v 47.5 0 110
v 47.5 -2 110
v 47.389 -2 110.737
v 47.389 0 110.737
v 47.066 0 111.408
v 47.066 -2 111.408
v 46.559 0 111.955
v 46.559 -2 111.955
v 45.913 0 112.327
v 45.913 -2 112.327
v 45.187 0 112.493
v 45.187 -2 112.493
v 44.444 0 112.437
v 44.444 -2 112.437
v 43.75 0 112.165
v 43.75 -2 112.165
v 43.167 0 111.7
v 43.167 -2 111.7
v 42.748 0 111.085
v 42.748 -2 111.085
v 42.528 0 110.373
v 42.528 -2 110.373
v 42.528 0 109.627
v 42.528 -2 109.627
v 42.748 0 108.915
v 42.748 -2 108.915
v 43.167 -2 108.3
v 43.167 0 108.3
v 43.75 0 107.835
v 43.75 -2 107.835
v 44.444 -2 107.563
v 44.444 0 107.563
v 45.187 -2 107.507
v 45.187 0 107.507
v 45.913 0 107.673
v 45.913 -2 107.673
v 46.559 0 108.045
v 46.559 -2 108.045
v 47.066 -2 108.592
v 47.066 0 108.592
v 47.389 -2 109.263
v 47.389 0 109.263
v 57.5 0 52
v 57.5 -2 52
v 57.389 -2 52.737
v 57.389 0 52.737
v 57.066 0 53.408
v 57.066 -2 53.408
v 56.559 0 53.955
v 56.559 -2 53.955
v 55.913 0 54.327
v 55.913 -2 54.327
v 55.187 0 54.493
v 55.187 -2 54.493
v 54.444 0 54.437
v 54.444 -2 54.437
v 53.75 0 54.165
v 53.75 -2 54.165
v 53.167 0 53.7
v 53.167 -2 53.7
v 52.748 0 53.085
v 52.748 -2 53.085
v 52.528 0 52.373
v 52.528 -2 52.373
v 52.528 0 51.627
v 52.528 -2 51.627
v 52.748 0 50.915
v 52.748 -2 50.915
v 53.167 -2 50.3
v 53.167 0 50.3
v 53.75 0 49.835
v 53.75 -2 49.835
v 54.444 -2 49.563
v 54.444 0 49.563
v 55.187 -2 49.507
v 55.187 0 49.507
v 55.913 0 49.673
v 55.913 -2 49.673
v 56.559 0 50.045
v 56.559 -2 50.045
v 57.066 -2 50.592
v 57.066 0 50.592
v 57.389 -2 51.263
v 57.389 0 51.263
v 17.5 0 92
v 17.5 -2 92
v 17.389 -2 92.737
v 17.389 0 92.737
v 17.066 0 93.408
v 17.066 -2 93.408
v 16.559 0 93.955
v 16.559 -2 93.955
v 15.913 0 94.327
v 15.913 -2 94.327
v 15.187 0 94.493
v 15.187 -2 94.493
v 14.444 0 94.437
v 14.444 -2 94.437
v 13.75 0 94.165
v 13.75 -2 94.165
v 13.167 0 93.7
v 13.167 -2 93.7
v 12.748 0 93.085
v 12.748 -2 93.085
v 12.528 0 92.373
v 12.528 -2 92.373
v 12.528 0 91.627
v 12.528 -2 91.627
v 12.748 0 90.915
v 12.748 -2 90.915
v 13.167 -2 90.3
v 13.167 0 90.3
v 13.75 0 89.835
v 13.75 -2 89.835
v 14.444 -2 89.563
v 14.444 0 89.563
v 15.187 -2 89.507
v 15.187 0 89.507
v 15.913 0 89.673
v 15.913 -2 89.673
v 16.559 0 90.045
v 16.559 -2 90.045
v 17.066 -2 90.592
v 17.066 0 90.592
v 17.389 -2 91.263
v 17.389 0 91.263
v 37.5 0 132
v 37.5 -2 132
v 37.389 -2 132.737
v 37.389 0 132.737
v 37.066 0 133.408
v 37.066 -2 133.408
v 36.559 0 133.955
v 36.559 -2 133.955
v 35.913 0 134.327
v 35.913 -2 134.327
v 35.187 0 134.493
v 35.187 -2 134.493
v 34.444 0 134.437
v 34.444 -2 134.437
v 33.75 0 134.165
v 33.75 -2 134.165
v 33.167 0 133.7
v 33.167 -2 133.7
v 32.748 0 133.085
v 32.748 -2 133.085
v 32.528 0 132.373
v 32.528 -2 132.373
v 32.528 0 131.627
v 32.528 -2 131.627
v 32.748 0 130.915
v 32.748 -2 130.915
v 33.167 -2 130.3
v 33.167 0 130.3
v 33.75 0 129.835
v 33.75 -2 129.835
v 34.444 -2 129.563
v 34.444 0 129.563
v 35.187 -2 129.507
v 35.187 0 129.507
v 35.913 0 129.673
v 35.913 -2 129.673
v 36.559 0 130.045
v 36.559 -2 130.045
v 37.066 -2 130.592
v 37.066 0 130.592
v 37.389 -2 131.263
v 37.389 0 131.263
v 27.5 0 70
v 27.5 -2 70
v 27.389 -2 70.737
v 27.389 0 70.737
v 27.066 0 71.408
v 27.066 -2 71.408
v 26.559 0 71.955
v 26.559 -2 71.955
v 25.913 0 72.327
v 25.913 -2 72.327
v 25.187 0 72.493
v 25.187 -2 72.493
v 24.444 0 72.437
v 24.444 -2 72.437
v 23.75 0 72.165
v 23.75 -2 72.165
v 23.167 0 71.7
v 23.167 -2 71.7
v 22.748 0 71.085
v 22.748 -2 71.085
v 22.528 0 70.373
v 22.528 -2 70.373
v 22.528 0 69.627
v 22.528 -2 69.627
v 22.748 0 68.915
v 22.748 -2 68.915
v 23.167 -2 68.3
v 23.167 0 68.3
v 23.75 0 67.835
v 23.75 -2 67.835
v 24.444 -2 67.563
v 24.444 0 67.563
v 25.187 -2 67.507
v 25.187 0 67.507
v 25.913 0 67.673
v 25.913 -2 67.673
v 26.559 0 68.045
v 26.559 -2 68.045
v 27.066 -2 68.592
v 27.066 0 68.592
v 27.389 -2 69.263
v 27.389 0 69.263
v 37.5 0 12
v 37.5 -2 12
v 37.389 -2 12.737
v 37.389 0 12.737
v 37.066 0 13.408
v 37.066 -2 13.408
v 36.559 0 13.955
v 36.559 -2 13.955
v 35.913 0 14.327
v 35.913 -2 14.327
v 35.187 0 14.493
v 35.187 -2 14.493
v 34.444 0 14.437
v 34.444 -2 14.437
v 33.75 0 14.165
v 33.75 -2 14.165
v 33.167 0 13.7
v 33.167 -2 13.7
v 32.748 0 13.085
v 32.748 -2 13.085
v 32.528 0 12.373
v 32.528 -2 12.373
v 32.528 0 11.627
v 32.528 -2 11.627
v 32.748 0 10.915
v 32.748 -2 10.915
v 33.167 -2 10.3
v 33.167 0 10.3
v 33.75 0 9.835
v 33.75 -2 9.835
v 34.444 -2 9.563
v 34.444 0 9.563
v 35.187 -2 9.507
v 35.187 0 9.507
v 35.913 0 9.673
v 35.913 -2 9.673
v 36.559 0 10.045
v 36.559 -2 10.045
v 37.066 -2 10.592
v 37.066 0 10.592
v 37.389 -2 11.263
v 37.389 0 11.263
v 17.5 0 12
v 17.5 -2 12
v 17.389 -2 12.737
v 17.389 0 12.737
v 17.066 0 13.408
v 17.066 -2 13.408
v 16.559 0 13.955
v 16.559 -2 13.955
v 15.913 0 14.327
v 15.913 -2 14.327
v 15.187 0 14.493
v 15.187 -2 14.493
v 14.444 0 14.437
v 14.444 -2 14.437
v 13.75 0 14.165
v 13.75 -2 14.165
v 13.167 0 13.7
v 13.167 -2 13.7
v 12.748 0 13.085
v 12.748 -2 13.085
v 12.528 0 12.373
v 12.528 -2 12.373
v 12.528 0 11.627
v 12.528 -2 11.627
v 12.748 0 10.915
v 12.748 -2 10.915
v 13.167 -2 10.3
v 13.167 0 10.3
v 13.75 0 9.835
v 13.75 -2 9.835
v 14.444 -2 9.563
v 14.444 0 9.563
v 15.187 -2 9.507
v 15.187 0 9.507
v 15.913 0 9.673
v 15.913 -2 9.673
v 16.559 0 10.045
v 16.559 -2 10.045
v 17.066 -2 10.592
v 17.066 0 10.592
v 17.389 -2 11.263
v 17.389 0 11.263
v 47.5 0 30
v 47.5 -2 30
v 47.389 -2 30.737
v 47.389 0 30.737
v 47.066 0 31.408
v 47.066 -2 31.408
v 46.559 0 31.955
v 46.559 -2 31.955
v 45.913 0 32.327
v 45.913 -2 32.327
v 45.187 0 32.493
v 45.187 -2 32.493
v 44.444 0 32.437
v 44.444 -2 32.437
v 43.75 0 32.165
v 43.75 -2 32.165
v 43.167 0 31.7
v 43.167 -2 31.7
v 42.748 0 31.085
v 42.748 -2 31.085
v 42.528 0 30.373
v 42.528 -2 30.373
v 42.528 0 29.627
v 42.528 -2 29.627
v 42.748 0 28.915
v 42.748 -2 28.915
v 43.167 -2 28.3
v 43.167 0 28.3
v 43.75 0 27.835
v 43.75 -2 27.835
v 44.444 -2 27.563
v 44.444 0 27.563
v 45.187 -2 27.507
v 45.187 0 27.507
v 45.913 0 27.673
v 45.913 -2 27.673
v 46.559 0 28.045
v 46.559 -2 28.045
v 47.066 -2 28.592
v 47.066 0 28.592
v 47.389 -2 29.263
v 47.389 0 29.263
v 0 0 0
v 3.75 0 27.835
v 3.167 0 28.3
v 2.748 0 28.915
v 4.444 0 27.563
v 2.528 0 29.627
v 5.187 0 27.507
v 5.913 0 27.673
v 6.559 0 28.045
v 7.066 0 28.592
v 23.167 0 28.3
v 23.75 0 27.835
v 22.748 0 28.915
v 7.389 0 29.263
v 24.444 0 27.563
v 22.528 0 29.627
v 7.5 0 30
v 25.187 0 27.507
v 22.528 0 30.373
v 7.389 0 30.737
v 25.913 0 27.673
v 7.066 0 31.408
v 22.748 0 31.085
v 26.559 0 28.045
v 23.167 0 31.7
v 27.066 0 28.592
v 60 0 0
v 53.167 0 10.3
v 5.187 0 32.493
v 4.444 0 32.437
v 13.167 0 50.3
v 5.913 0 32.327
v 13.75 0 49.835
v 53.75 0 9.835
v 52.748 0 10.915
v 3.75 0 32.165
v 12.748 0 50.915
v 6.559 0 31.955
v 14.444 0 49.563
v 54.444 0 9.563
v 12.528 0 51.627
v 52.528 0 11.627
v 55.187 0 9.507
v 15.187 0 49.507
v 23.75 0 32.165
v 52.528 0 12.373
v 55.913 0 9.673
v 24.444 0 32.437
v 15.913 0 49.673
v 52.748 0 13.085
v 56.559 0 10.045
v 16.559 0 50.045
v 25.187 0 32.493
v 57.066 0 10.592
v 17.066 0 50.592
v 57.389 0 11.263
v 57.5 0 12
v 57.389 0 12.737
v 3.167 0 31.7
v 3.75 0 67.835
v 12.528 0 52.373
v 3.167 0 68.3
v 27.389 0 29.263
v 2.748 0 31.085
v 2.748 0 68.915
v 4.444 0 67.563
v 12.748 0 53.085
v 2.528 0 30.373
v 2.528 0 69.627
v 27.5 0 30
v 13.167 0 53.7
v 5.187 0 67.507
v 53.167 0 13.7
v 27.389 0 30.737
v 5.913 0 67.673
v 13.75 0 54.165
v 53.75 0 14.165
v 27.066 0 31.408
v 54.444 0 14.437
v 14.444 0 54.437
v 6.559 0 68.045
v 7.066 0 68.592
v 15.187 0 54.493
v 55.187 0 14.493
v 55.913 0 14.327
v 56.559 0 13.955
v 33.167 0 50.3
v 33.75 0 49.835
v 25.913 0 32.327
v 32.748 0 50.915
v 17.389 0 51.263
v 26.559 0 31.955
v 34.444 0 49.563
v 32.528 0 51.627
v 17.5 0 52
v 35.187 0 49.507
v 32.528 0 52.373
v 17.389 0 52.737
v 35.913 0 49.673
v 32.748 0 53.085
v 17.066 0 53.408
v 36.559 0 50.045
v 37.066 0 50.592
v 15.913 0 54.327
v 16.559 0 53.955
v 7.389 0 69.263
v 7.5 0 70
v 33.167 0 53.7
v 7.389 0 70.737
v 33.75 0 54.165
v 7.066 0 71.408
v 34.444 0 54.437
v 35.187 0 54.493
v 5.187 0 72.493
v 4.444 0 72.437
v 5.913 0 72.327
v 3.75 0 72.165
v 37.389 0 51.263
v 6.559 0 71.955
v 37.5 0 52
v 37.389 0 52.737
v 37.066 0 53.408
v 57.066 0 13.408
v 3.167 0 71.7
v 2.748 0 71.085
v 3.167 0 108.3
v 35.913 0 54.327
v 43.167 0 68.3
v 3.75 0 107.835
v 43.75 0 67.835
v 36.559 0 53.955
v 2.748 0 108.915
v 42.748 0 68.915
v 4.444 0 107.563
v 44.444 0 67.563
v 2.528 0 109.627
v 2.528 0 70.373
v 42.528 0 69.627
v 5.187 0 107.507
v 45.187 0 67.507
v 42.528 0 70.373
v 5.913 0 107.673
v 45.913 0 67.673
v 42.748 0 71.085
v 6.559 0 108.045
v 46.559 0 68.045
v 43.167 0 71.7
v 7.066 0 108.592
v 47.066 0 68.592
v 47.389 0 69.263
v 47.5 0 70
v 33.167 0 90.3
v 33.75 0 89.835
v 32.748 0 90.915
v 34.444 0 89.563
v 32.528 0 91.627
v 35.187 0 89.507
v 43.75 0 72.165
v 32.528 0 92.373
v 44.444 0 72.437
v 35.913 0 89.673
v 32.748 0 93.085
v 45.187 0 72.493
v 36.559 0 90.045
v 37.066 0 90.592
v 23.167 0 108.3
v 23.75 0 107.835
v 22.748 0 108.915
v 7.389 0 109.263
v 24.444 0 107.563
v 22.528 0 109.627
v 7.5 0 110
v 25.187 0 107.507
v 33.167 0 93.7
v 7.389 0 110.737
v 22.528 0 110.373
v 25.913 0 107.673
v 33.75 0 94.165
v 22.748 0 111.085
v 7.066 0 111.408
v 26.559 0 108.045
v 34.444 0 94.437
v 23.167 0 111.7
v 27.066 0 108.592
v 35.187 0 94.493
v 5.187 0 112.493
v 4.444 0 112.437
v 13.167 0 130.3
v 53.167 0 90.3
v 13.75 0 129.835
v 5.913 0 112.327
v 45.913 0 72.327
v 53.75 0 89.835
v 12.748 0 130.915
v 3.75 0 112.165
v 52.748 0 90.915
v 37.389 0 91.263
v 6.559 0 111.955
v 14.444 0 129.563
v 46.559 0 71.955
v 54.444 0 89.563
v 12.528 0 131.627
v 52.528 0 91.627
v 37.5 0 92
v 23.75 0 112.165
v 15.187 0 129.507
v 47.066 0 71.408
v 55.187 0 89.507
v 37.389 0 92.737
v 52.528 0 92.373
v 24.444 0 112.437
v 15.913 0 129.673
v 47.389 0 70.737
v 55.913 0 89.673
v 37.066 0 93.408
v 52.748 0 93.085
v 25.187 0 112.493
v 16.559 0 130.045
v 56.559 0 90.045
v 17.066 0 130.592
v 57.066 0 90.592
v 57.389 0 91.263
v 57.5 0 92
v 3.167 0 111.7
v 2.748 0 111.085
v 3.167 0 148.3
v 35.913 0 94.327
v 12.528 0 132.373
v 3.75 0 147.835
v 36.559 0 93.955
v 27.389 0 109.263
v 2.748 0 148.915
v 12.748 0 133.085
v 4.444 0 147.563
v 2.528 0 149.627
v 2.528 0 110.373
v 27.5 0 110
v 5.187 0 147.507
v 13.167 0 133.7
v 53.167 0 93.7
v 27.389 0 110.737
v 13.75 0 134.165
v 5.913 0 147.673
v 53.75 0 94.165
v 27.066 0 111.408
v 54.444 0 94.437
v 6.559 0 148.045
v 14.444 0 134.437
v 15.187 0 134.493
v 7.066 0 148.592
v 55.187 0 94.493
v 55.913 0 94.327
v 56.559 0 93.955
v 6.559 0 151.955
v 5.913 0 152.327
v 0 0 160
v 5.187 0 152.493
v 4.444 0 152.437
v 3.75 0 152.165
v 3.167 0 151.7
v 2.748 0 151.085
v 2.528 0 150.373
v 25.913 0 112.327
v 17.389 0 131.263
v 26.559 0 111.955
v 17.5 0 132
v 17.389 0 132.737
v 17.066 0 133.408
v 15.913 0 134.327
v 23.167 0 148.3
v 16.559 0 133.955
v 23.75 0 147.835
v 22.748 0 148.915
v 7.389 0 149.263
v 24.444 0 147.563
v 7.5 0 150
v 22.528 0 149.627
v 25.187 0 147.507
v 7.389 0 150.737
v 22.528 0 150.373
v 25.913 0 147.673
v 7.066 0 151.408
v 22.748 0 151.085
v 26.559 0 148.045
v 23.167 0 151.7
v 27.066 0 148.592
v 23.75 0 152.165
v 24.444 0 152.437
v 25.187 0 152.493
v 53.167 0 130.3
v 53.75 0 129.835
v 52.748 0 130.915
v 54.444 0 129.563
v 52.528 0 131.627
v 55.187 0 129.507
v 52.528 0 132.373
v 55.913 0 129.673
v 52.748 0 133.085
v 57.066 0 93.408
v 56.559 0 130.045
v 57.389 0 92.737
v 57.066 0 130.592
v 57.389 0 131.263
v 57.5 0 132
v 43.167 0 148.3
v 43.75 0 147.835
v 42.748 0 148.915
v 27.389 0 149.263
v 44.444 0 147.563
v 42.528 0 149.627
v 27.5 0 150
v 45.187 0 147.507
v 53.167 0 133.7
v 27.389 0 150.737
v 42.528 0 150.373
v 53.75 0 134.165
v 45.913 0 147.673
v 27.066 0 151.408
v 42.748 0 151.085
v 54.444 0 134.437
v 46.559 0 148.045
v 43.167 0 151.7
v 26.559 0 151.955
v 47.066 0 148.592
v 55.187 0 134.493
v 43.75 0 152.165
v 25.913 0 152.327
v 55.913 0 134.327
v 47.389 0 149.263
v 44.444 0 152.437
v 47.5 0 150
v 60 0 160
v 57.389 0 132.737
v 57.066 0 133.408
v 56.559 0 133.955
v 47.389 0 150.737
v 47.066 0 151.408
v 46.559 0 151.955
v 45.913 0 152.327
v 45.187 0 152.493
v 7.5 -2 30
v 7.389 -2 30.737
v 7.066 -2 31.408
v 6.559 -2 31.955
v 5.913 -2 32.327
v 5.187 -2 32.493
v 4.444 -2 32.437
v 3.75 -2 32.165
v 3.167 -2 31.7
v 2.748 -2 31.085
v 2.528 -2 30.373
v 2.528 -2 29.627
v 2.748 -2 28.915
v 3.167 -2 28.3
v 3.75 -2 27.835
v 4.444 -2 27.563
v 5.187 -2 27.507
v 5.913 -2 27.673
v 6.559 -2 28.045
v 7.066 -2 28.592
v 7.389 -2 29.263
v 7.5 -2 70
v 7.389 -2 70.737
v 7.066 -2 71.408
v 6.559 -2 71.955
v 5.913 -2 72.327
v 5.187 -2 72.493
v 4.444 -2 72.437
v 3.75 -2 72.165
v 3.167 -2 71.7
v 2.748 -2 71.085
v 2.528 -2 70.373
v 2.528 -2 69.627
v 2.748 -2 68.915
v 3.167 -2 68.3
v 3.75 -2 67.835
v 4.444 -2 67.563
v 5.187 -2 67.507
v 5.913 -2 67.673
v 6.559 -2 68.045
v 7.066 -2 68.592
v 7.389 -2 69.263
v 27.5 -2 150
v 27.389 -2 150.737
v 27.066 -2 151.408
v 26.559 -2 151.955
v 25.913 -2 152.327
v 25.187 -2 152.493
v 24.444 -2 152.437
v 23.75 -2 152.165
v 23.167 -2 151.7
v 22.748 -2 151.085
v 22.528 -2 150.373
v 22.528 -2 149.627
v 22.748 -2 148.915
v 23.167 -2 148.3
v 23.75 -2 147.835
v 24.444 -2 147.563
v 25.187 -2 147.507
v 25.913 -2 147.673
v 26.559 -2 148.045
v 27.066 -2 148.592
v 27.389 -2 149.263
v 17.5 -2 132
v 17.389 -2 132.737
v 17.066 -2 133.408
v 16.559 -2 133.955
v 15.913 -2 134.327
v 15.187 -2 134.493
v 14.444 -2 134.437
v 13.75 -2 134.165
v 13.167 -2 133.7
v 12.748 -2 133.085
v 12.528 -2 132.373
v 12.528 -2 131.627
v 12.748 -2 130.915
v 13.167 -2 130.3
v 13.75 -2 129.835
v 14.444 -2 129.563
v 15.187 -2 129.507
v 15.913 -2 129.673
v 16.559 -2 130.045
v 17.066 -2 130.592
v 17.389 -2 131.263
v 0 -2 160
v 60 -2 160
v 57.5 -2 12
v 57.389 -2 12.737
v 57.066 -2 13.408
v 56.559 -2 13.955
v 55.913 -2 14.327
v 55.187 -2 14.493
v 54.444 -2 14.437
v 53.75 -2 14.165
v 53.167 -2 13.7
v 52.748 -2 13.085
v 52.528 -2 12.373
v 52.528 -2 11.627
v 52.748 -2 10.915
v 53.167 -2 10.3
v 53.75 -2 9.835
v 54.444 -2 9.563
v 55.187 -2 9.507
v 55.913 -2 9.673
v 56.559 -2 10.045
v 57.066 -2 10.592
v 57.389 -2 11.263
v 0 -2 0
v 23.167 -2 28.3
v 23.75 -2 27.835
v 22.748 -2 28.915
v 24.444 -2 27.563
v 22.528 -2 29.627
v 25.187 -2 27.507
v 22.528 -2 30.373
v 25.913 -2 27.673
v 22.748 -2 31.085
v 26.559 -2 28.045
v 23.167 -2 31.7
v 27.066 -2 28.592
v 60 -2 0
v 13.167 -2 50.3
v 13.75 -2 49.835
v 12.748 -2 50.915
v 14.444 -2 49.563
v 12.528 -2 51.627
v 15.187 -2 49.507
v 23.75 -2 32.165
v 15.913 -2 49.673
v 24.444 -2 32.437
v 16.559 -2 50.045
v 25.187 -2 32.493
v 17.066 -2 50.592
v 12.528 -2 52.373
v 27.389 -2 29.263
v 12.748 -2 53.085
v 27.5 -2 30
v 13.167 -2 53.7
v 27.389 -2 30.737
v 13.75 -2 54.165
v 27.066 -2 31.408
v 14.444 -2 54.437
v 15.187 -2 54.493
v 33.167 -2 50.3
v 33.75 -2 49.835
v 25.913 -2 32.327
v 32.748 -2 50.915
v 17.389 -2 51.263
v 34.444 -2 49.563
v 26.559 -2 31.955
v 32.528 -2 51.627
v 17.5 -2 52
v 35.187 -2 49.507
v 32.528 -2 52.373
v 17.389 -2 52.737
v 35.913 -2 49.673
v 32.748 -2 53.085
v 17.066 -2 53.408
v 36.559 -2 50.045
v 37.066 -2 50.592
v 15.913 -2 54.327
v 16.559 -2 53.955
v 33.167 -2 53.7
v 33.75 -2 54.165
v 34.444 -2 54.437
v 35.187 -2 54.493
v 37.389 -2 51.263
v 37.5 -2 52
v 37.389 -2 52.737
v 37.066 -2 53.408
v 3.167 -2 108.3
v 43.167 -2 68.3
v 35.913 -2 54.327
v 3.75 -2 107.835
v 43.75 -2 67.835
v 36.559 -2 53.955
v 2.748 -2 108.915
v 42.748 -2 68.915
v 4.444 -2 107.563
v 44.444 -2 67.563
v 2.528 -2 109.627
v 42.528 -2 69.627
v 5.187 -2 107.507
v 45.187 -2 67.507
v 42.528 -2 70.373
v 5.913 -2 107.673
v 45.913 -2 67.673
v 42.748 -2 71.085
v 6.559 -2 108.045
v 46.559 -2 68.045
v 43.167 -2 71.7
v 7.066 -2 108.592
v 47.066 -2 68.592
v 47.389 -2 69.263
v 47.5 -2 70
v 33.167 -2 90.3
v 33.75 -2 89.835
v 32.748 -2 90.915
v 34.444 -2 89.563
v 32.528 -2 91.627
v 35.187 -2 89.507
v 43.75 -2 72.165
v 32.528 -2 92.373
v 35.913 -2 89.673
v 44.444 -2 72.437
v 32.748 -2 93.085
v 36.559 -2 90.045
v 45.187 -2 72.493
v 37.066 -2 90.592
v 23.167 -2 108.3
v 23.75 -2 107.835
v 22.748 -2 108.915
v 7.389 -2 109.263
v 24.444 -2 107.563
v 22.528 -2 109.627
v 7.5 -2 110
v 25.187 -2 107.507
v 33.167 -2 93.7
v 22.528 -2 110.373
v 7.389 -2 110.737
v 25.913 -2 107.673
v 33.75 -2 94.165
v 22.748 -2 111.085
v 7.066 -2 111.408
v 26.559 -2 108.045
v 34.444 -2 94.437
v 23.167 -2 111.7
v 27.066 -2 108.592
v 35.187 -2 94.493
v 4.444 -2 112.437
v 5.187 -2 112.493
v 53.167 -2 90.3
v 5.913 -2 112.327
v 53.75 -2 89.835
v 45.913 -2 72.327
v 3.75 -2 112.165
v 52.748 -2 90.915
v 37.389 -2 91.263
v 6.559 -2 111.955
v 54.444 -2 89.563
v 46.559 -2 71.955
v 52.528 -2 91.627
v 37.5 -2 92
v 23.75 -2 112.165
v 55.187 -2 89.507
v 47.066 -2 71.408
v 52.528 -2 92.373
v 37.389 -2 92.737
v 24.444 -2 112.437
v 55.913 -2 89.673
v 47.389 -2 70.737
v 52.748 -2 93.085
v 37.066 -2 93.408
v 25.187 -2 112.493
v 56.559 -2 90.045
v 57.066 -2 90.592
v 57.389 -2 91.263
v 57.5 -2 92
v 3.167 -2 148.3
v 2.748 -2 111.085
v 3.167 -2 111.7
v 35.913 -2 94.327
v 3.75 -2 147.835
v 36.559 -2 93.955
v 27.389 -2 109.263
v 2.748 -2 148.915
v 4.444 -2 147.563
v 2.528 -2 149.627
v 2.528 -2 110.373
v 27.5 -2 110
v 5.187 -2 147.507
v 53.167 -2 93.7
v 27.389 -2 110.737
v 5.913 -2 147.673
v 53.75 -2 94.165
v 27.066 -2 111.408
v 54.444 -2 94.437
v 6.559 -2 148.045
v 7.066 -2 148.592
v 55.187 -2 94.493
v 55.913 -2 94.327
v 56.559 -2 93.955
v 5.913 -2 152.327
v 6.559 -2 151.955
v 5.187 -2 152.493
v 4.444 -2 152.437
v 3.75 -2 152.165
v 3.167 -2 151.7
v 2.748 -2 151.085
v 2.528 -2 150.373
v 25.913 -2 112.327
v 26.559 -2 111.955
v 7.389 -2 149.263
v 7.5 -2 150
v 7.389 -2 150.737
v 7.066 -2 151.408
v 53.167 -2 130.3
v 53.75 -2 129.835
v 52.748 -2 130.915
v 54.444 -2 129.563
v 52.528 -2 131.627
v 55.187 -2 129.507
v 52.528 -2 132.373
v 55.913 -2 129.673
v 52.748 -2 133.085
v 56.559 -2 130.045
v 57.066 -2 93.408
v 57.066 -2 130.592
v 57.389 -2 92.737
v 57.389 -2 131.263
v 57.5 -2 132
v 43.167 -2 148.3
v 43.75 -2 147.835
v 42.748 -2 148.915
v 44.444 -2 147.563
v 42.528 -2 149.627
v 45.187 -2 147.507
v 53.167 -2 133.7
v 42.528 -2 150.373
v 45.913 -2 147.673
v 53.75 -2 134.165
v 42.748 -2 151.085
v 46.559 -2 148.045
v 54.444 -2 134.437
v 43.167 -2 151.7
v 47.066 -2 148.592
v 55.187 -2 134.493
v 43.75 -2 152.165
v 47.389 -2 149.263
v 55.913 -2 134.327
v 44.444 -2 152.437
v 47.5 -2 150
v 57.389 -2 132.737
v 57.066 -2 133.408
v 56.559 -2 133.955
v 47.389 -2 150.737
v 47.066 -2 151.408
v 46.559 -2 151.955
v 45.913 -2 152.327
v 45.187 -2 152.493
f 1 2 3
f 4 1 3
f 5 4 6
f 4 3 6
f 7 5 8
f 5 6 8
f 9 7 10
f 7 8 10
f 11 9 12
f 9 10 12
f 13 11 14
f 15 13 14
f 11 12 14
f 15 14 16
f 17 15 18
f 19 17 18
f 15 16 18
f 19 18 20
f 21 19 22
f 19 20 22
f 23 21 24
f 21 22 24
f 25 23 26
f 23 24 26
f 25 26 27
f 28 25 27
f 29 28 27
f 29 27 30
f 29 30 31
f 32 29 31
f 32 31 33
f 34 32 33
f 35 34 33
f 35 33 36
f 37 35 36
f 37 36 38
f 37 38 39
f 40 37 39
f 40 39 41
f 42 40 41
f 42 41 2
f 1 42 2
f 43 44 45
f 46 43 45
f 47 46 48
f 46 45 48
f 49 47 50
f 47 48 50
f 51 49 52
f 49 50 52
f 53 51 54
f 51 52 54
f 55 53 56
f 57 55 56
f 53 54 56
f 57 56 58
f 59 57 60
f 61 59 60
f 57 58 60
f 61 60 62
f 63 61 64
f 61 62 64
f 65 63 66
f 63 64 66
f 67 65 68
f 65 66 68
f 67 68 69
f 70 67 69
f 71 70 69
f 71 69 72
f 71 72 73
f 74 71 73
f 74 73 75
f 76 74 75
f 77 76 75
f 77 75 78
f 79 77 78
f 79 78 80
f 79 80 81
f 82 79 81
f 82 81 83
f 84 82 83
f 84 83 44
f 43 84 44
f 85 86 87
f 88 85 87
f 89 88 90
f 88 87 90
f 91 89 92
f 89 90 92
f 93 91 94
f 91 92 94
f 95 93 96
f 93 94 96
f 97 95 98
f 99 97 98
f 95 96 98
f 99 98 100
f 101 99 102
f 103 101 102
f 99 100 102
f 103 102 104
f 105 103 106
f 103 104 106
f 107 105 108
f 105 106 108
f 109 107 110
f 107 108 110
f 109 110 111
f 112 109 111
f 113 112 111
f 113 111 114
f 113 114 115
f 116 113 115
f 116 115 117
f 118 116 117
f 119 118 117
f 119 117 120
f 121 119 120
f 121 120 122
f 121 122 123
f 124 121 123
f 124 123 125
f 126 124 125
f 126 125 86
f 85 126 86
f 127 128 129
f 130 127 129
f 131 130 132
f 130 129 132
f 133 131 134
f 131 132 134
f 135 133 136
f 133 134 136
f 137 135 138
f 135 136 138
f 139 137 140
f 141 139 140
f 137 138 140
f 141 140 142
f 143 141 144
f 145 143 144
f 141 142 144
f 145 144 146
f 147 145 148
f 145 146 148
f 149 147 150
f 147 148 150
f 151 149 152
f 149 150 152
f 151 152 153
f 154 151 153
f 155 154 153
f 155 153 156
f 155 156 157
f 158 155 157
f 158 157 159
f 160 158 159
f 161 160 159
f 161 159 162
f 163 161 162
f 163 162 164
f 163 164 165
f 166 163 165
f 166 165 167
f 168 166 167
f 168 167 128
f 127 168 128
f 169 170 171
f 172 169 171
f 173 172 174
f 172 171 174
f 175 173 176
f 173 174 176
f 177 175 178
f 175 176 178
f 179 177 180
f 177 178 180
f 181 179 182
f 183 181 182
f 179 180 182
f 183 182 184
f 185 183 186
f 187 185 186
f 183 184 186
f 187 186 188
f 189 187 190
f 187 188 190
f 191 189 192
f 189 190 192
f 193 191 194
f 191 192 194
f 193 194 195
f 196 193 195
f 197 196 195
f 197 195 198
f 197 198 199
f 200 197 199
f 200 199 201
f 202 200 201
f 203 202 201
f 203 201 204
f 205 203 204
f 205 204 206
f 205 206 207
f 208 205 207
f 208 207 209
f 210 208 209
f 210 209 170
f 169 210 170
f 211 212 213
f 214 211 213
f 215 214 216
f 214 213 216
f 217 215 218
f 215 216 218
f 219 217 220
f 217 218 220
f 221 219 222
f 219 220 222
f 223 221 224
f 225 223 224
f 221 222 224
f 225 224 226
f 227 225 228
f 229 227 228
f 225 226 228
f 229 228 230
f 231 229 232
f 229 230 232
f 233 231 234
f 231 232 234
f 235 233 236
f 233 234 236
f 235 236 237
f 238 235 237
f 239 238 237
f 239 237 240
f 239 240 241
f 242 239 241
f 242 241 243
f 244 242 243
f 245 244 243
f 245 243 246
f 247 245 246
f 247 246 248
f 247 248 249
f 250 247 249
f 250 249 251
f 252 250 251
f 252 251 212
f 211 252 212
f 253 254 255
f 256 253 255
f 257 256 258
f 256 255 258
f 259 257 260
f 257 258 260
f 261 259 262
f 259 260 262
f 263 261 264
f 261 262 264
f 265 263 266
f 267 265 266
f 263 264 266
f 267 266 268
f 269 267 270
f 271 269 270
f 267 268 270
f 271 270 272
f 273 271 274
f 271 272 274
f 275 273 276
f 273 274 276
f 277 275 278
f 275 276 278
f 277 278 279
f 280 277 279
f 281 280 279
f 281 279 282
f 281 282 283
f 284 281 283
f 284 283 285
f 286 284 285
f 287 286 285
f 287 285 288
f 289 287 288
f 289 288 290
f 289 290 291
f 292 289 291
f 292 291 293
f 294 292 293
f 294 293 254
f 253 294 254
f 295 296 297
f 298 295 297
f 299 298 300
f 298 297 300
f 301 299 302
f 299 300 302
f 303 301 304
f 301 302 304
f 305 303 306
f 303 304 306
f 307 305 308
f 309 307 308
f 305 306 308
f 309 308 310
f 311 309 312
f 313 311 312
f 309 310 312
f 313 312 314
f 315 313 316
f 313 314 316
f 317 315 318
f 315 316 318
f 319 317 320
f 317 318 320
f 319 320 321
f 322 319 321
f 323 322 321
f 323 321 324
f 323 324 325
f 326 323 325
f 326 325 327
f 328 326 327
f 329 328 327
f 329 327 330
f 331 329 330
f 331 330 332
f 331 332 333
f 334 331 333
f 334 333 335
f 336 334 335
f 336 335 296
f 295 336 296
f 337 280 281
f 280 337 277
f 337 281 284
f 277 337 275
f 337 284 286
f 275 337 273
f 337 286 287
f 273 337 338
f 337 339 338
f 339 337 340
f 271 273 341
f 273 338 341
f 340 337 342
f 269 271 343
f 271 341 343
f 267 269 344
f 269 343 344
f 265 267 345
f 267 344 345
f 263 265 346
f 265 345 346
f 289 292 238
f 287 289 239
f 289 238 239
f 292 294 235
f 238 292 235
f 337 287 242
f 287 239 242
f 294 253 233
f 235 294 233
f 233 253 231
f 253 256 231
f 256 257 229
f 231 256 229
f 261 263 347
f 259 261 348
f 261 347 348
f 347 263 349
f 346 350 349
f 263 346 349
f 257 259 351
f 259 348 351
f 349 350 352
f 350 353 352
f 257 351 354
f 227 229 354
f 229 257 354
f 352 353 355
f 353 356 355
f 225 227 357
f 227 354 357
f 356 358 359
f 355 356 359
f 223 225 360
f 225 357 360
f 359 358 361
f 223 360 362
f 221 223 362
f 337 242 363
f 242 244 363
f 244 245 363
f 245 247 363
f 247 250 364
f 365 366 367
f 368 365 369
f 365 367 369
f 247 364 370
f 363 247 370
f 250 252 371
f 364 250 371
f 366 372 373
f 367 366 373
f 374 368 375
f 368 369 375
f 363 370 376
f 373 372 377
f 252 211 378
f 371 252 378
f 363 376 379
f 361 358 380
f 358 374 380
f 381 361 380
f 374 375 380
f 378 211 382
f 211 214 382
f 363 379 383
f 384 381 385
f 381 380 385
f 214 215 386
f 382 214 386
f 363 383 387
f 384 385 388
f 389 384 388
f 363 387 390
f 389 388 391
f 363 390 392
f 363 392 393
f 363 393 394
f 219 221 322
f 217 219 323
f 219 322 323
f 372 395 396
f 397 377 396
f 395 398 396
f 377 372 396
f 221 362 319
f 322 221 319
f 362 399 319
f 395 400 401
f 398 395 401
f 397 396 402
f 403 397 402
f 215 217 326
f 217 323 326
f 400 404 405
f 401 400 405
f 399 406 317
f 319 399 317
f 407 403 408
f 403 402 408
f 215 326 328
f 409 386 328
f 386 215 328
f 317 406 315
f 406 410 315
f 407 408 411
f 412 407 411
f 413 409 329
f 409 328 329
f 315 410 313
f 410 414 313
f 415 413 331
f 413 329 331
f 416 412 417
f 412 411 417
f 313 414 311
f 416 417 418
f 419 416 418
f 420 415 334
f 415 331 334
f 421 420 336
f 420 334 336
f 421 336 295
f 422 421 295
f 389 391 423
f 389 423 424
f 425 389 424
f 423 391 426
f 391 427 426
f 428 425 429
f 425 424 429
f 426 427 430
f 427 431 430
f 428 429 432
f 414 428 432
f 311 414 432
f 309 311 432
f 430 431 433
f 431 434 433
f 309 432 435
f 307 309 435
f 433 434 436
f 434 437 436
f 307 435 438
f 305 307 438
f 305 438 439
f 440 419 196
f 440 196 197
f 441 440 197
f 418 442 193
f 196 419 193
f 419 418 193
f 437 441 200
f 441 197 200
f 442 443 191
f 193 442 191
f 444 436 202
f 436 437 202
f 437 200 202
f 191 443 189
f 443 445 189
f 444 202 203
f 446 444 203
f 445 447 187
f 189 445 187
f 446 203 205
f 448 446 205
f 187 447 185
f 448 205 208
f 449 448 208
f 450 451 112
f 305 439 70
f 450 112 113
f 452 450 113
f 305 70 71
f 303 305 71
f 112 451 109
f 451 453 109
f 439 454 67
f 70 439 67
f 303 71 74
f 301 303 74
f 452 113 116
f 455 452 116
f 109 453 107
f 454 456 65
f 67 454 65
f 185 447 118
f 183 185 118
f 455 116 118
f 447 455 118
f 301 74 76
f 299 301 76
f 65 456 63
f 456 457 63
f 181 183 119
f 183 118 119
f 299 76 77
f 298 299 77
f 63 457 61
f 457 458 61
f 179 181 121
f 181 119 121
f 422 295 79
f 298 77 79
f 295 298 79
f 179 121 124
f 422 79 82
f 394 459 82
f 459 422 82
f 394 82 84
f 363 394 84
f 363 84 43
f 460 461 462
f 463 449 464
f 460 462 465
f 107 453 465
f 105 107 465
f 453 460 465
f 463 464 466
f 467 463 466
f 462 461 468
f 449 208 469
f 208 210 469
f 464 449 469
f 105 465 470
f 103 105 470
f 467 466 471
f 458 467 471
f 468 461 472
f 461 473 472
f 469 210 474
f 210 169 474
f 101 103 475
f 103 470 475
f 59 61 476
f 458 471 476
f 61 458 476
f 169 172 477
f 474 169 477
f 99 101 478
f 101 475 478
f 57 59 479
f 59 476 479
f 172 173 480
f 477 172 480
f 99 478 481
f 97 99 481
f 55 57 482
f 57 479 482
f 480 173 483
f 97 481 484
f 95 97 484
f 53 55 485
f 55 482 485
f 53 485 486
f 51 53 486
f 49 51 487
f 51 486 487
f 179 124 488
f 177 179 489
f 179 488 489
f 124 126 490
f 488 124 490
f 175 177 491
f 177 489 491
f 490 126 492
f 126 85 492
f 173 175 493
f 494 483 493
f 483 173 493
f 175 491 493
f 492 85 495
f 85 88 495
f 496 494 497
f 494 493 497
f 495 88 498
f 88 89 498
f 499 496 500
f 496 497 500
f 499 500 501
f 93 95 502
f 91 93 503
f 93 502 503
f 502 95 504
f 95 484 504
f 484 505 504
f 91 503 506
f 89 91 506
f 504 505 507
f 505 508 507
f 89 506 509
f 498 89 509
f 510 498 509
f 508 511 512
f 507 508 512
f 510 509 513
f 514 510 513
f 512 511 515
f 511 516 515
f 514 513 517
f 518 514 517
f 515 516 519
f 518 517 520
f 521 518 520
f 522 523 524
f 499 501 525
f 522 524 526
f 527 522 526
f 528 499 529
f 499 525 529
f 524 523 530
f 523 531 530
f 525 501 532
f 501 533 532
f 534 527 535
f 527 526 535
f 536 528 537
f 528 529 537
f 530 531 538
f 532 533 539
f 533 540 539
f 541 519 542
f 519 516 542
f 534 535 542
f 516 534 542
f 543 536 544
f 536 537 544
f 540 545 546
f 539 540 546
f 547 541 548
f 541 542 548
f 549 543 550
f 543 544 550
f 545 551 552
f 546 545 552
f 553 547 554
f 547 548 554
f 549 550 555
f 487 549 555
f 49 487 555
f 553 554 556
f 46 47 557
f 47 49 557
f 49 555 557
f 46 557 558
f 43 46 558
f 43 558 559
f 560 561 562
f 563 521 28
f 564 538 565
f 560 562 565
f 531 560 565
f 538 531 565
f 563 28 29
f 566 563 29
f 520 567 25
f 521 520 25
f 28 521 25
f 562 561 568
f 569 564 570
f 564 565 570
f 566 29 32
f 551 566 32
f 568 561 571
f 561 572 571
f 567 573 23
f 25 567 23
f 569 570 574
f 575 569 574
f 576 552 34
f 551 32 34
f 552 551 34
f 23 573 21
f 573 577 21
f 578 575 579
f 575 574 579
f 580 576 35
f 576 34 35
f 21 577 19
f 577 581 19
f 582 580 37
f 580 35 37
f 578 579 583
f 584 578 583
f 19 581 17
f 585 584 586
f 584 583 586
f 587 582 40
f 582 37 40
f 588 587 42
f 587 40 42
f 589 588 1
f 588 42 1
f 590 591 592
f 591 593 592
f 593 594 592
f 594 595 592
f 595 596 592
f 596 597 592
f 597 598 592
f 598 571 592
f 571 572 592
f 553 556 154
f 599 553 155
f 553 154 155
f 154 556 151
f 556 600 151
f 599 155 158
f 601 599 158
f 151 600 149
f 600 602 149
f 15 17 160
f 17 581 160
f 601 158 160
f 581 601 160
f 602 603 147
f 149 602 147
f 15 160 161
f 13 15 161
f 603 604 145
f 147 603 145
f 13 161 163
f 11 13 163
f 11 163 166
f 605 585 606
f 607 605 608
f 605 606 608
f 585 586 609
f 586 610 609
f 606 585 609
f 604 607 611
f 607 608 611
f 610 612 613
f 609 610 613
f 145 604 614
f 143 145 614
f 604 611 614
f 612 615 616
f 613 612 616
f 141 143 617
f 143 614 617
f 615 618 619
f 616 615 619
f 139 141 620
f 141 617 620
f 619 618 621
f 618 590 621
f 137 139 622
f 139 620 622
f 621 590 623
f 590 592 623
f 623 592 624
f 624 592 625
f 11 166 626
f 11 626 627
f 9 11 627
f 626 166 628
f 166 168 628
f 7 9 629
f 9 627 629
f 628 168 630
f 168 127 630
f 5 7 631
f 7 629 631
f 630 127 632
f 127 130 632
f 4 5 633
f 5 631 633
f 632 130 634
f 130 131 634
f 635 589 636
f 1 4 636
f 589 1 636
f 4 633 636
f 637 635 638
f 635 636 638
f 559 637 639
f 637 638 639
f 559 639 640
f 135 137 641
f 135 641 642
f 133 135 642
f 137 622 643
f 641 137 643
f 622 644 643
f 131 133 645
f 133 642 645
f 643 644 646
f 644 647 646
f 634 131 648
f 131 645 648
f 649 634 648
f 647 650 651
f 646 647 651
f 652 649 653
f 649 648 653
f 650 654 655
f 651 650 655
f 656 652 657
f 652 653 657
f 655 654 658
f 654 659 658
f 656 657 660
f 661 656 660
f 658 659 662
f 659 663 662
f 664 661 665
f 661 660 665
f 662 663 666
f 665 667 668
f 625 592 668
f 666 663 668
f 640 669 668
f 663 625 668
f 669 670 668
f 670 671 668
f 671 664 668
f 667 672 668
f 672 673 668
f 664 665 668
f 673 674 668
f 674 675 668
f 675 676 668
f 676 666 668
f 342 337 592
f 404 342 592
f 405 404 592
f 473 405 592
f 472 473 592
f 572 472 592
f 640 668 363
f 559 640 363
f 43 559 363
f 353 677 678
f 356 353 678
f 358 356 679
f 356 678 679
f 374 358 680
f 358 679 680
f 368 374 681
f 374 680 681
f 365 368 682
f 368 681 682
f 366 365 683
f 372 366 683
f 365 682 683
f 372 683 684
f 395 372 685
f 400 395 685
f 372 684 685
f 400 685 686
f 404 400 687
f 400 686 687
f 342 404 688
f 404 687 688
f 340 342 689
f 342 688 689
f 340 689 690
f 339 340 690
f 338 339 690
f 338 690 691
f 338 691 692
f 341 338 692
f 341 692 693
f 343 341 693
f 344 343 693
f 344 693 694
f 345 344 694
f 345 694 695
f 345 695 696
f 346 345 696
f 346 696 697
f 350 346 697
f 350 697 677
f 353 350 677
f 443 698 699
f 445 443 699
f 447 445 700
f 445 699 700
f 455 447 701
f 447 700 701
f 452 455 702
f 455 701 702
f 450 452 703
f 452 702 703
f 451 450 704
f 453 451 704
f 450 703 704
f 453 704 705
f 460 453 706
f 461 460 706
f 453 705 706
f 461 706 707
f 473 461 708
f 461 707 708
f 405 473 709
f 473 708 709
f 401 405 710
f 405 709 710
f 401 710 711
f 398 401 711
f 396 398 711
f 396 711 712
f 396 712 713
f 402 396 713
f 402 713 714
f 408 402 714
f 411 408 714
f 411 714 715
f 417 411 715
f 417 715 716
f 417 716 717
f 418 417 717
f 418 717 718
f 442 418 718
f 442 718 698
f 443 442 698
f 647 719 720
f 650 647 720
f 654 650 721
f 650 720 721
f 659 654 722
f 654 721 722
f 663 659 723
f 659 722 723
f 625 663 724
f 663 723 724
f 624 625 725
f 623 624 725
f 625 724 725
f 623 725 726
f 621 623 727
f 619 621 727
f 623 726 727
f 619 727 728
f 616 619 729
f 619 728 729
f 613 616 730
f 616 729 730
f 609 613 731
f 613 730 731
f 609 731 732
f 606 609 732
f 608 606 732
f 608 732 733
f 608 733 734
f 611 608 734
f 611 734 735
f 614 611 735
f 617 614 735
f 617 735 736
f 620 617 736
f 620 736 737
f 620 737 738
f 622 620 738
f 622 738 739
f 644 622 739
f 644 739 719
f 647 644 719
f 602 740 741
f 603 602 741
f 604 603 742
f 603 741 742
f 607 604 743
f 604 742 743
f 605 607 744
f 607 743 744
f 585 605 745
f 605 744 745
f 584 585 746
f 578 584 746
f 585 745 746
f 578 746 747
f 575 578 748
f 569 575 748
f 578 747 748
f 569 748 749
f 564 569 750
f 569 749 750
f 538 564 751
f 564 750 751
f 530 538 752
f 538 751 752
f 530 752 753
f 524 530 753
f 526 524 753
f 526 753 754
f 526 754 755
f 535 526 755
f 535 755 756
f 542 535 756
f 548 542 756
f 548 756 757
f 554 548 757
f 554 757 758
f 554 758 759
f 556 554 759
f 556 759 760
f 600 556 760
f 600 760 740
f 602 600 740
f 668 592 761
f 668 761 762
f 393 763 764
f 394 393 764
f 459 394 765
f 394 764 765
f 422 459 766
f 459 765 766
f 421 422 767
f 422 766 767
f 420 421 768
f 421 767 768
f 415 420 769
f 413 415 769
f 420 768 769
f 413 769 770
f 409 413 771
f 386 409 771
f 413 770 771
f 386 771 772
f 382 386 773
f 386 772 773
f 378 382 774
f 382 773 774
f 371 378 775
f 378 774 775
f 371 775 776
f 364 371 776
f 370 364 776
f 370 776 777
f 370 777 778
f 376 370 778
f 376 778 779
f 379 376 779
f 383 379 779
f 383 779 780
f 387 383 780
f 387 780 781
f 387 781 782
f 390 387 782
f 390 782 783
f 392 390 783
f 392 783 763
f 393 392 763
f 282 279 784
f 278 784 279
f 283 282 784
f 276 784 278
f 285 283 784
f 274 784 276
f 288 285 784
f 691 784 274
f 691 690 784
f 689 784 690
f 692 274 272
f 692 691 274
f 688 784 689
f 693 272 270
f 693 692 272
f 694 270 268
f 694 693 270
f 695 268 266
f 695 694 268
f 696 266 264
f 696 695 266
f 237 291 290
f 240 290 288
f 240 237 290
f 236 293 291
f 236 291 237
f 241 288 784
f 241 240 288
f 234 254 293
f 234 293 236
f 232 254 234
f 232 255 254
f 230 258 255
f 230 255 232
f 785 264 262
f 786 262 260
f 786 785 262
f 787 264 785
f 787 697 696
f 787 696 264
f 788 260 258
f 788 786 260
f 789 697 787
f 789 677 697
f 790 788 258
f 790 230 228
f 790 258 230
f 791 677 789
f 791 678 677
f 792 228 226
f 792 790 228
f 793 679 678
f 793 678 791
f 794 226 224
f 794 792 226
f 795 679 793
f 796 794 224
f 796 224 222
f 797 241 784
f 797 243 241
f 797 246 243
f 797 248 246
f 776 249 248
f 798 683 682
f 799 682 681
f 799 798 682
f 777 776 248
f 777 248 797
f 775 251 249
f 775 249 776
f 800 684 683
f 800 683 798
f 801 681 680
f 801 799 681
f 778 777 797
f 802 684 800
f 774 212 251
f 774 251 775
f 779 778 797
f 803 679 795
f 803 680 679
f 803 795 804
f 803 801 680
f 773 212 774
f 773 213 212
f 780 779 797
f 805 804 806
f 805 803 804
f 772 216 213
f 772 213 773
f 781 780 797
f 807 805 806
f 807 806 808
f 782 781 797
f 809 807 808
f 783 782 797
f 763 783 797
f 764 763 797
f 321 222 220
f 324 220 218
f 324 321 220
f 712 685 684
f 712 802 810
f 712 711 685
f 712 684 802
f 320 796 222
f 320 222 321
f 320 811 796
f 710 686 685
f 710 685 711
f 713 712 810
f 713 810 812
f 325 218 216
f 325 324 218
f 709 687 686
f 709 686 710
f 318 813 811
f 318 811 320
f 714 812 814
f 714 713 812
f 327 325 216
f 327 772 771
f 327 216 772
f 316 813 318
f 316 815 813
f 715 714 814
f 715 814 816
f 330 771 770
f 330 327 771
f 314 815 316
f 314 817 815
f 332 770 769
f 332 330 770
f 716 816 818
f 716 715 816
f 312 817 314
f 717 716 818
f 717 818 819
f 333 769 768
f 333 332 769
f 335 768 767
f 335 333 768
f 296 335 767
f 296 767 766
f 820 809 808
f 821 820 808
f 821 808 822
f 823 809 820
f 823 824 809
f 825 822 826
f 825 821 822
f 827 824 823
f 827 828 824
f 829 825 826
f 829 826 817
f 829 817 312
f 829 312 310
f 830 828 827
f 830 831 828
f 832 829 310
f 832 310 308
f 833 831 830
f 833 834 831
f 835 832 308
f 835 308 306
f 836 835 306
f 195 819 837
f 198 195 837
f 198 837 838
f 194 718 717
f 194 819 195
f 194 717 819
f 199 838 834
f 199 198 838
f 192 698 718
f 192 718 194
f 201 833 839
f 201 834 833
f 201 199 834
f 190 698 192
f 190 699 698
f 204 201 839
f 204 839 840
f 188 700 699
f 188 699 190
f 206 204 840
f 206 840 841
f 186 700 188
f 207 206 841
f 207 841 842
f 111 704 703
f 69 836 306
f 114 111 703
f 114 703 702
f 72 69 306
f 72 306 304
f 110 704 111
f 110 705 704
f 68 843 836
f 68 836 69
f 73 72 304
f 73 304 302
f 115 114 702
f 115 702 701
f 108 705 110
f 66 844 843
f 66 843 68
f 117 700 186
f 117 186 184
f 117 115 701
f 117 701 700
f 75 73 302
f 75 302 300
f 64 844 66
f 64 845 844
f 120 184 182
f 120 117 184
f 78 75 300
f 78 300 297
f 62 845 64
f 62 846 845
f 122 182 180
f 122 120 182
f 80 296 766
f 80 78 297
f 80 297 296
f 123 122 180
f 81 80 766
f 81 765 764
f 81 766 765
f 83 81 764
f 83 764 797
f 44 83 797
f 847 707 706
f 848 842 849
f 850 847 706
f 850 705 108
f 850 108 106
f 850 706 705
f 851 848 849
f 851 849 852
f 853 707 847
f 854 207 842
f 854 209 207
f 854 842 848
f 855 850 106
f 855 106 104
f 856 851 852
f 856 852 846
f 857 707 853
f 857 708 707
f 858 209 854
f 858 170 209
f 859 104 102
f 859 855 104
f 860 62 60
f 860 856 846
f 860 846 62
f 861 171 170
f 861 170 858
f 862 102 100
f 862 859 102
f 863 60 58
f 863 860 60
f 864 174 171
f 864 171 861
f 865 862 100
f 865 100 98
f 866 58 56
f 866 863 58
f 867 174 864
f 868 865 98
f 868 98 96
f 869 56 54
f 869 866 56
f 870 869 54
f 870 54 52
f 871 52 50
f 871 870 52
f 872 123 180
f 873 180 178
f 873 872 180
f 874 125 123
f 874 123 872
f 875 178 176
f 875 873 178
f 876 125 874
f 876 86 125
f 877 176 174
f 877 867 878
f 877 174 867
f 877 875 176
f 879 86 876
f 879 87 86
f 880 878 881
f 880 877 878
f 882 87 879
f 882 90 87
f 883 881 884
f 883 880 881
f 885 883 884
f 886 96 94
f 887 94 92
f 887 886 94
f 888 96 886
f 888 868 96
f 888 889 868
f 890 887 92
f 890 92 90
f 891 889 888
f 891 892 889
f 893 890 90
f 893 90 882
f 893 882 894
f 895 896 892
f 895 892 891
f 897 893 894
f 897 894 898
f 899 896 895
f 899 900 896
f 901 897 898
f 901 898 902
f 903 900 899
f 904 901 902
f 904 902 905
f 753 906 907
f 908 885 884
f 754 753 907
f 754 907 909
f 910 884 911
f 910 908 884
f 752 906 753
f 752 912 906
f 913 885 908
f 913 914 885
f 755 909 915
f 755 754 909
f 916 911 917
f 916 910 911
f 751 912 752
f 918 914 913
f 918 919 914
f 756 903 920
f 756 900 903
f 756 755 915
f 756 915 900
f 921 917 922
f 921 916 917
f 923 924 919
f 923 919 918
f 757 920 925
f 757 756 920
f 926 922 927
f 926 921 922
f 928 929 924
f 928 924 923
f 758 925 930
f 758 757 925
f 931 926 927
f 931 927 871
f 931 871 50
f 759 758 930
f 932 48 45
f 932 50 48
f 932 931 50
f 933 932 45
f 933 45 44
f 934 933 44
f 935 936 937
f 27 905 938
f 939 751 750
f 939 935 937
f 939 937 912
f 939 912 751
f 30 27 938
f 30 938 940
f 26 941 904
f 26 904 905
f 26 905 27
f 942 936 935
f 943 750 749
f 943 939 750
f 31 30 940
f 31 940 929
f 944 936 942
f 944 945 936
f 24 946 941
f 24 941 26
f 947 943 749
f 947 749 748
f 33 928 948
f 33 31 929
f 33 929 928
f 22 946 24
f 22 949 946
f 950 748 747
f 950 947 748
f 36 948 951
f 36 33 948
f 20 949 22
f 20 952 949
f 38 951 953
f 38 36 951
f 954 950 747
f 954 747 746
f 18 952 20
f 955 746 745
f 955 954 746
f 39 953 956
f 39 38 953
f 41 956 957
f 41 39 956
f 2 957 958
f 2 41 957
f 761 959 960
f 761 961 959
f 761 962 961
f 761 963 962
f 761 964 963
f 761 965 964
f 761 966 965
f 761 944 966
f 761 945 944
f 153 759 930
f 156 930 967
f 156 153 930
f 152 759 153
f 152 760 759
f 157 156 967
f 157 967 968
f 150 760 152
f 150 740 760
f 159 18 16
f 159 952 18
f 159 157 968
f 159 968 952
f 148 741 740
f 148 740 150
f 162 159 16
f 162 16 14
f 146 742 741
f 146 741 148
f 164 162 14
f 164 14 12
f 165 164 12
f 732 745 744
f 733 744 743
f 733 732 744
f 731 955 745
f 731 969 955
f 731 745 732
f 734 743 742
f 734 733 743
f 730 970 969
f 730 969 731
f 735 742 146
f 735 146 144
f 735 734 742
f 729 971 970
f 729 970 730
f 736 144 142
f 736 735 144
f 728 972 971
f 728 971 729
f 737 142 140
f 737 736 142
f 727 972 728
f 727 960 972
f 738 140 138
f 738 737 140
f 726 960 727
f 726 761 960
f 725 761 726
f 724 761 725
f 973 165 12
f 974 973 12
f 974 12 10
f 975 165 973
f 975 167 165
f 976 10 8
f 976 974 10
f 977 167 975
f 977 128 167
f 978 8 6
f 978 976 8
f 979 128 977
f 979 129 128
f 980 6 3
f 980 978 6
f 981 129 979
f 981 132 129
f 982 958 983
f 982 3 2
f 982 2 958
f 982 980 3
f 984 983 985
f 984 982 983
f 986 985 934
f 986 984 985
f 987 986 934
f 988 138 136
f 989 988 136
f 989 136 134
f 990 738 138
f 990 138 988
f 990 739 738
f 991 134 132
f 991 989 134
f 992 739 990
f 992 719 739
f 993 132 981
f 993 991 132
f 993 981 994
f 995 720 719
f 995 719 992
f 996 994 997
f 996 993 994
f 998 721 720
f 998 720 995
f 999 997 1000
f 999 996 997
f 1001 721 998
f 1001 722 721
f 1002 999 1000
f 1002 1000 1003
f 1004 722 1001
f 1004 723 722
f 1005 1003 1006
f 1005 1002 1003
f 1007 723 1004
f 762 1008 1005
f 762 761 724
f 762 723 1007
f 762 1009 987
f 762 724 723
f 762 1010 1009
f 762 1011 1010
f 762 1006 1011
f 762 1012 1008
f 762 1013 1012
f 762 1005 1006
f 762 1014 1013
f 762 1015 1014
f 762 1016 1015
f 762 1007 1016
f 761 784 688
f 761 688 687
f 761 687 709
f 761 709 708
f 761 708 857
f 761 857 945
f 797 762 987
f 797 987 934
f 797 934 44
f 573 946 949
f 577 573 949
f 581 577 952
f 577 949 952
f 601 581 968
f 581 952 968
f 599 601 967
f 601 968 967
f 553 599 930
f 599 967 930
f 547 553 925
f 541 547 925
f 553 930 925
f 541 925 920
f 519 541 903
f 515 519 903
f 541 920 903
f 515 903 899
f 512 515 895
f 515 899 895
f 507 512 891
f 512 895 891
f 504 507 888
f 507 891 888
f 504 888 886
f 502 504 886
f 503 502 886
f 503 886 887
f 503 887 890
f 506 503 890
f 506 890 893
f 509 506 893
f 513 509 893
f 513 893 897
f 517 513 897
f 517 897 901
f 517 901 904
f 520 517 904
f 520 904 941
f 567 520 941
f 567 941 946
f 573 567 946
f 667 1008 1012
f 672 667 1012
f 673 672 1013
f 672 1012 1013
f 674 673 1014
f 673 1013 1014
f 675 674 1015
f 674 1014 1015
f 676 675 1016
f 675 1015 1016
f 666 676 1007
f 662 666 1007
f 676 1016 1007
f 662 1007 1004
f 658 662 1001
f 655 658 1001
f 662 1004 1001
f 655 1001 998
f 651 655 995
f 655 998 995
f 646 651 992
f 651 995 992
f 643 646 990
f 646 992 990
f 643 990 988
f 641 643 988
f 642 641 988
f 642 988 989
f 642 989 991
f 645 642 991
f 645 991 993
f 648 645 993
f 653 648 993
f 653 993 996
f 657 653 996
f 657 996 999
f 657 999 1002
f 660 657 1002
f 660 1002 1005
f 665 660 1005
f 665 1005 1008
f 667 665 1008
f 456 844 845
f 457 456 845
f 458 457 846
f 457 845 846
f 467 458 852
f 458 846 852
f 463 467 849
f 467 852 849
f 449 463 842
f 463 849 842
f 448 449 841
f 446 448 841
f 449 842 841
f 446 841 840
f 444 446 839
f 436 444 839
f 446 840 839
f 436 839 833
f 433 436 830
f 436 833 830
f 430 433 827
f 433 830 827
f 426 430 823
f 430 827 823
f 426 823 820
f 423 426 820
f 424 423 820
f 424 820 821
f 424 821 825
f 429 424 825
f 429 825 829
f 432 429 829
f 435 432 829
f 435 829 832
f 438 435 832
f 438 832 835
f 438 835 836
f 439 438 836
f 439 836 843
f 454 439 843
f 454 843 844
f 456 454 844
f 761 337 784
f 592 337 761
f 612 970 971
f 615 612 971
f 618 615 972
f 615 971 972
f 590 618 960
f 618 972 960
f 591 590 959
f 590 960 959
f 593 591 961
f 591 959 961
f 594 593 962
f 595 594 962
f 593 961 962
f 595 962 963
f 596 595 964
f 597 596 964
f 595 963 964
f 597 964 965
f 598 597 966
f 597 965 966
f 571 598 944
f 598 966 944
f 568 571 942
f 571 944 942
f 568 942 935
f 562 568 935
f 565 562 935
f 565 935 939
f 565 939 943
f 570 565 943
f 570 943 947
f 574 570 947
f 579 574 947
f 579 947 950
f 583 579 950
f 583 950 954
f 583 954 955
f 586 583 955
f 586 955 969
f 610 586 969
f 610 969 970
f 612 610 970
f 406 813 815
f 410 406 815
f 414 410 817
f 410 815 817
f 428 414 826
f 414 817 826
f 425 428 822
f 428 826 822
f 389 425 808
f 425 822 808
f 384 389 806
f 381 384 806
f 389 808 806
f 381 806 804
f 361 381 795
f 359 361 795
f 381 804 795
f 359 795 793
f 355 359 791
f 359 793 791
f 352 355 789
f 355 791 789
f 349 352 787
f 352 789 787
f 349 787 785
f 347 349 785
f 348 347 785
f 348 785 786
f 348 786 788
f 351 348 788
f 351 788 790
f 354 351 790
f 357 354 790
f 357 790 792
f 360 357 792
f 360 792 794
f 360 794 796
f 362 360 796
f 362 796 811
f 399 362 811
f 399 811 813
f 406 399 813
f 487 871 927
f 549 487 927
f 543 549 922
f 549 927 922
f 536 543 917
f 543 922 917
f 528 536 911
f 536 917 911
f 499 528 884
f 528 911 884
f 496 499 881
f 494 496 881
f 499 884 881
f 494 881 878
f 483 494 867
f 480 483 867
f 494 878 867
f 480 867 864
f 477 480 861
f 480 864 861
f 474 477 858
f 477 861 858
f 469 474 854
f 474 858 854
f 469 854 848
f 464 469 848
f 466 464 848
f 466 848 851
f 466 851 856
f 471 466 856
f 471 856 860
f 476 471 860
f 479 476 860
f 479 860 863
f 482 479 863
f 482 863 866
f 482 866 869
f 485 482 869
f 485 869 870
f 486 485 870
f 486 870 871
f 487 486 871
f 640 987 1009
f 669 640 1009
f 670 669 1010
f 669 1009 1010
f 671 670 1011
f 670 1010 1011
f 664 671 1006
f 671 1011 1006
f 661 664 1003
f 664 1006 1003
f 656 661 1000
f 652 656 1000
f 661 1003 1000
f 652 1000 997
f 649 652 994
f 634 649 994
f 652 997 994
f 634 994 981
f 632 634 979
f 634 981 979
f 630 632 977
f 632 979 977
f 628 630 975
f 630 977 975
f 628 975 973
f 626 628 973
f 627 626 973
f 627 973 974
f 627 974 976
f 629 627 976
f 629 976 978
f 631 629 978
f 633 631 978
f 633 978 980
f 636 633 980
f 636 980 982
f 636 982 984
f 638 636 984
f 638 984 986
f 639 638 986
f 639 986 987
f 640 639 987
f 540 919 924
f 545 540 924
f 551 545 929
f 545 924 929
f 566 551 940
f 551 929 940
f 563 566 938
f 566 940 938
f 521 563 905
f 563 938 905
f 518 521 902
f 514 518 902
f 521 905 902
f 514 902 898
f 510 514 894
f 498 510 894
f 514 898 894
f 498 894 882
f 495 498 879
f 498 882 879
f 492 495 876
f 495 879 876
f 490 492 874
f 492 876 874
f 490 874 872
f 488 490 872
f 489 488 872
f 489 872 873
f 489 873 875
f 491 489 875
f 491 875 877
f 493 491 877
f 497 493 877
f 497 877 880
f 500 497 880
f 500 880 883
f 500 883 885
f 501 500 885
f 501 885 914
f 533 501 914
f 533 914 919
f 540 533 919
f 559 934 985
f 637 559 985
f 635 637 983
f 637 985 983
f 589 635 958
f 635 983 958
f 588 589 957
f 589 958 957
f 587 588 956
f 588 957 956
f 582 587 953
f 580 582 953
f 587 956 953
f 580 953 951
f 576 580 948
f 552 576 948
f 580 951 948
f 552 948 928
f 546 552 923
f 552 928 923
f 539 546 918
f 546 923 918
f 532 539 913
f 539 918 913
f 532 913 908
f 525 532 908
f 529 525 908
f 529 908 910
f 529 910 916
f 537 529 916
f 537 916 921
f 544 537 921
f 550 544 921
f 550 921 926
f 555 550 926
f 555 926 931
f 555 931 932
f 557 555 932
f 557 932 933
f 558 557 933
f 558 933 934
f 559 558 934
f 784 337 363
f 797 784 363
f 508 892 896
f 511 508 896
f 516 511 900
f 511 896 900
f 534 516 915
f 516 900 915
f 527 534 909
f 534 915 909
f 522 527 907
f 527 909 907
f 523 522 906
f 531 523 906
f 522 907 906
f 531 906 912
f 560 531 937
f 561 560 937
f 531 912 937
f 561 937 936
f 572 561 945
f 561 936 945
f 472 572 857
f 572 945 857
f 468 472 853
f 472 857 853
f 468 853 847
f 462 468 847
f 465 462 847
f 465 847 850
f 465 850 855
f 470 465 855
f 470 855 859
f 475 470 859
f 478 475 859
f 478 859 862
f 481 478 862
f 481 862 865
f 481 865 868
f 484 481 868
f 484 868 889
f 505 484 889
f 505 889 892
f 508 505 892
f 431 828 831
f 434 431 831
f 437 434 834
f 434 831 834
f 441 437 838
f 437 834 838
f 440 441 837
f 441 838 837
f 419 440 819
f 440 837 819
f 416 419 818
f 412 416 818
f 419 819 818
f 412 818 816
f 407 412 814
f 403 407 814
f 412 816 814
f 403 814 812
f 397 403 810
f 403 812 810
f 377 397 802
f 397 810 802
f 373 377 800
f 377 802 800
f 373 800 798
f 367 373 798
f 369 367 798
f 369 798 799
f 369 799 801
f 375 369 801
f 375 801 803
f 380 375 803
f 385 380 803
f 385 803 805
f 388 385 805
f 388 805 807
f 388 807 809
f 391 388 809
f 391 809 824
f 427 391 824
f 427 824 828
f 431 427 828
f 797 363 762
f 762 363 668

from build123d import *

# Parameters (mm, degrees)
SKETCH_W                     = 60
SKETCH_H                     = 160
PAD_DEPTH                    = 2
SKETCH001_R                  = 2.5
POCKET_DEPTH                 = 343.784557
SKETCH001_LINEARPATTERN_2_R  = 2.5
POCKET_LINEARPATTERN_2_DEPTH = 343.784557
SKETCH001_LINEARPATTERN_3_R  = 2.5
POCKET_LINEARPATTERN_3_DEPTH = 343.784557
LINEARPATTERN001_COUNT       = 4
LINEARPATTERN001_PITCH       = 40


with BuildPart() as part:
    # Sketch → Pad (new body)
    with BuildSketch(Plane.XZ):
        with Locations((30, 80)):
            Rectangle(SKETCH_W, SKETCH_H)
    extrude(amount=PAD_DEPTH)

    # Sketch001 (on Face6 of Pad) → Pocket (cut, through all)
    with BuildSketch(Plane.XZ.offset(2)):
        with Locations((15, 12)):
            Circle(SKETCH001_R)
        with Locations((5, 30)):
            Circle(SKETCH001_R)
    pocket = extrude(amount=-POCKET_DEPTH, mode=Mode.SUBTRACT)

    # Sketch001 LinearPattern 2 → Pocket LinearPattern 2 (cut, through all)
    with BuildSketch(Plane(origin=(20, -2, 0), x_dir=(1, 0, 0), z_dir=(0, -1, 0))):
        with Locations((15, 12)):
            Circle(SKETCH001_LINEARPATTERN_2_R)
        with Locations((5, 30)):
            Circle(SKETCH001_LINEARPATTERN_2_R)
    pocket_linearpattern_2 = extrude(amount=-POCKET_LINEARPATTERN_2_DEPTH, mode=Mode.SUBTRACT)

    # Sketch001 LinearPattern 3 → Pocket LinearPattern 3 (cut, through all)
    with BuildSketch(Plane(origin=(40, -2, 0), x_dir=(1, 0, 0), z_dir=(0, -1, 0))):
        with Locations((15, 12)):
            Circle(SKETCH001_LINEARPATTERN_3_R)
        with Locations((5, 30)):
            Circle(SKETCH001_LINEARPATTERN_3_R)
    pocket_linearpattern_3 = extrude(amount=-POCKET_LINEARPATTERN_3_DEPTH, mode=Mode.SUBTRACT)

    # LinearPattern001: Pocket, Pocket LinearPattern 2, Pocket LinearPattern 3 ×4
    with Locations(*[(0, 0, i * LINEARPATTERN001_PITCH) for i in range(1, LINEARPATTERN001_COUNT)]):
        add(pocket, mode=Mode.SUBTRACT)
        add(pocket_linearpattern_2, mode=Mode.SUBTRACT)
        add(pocket_linearpattern_3, mode=Mode.SUBTRACT)


solid = part.part
